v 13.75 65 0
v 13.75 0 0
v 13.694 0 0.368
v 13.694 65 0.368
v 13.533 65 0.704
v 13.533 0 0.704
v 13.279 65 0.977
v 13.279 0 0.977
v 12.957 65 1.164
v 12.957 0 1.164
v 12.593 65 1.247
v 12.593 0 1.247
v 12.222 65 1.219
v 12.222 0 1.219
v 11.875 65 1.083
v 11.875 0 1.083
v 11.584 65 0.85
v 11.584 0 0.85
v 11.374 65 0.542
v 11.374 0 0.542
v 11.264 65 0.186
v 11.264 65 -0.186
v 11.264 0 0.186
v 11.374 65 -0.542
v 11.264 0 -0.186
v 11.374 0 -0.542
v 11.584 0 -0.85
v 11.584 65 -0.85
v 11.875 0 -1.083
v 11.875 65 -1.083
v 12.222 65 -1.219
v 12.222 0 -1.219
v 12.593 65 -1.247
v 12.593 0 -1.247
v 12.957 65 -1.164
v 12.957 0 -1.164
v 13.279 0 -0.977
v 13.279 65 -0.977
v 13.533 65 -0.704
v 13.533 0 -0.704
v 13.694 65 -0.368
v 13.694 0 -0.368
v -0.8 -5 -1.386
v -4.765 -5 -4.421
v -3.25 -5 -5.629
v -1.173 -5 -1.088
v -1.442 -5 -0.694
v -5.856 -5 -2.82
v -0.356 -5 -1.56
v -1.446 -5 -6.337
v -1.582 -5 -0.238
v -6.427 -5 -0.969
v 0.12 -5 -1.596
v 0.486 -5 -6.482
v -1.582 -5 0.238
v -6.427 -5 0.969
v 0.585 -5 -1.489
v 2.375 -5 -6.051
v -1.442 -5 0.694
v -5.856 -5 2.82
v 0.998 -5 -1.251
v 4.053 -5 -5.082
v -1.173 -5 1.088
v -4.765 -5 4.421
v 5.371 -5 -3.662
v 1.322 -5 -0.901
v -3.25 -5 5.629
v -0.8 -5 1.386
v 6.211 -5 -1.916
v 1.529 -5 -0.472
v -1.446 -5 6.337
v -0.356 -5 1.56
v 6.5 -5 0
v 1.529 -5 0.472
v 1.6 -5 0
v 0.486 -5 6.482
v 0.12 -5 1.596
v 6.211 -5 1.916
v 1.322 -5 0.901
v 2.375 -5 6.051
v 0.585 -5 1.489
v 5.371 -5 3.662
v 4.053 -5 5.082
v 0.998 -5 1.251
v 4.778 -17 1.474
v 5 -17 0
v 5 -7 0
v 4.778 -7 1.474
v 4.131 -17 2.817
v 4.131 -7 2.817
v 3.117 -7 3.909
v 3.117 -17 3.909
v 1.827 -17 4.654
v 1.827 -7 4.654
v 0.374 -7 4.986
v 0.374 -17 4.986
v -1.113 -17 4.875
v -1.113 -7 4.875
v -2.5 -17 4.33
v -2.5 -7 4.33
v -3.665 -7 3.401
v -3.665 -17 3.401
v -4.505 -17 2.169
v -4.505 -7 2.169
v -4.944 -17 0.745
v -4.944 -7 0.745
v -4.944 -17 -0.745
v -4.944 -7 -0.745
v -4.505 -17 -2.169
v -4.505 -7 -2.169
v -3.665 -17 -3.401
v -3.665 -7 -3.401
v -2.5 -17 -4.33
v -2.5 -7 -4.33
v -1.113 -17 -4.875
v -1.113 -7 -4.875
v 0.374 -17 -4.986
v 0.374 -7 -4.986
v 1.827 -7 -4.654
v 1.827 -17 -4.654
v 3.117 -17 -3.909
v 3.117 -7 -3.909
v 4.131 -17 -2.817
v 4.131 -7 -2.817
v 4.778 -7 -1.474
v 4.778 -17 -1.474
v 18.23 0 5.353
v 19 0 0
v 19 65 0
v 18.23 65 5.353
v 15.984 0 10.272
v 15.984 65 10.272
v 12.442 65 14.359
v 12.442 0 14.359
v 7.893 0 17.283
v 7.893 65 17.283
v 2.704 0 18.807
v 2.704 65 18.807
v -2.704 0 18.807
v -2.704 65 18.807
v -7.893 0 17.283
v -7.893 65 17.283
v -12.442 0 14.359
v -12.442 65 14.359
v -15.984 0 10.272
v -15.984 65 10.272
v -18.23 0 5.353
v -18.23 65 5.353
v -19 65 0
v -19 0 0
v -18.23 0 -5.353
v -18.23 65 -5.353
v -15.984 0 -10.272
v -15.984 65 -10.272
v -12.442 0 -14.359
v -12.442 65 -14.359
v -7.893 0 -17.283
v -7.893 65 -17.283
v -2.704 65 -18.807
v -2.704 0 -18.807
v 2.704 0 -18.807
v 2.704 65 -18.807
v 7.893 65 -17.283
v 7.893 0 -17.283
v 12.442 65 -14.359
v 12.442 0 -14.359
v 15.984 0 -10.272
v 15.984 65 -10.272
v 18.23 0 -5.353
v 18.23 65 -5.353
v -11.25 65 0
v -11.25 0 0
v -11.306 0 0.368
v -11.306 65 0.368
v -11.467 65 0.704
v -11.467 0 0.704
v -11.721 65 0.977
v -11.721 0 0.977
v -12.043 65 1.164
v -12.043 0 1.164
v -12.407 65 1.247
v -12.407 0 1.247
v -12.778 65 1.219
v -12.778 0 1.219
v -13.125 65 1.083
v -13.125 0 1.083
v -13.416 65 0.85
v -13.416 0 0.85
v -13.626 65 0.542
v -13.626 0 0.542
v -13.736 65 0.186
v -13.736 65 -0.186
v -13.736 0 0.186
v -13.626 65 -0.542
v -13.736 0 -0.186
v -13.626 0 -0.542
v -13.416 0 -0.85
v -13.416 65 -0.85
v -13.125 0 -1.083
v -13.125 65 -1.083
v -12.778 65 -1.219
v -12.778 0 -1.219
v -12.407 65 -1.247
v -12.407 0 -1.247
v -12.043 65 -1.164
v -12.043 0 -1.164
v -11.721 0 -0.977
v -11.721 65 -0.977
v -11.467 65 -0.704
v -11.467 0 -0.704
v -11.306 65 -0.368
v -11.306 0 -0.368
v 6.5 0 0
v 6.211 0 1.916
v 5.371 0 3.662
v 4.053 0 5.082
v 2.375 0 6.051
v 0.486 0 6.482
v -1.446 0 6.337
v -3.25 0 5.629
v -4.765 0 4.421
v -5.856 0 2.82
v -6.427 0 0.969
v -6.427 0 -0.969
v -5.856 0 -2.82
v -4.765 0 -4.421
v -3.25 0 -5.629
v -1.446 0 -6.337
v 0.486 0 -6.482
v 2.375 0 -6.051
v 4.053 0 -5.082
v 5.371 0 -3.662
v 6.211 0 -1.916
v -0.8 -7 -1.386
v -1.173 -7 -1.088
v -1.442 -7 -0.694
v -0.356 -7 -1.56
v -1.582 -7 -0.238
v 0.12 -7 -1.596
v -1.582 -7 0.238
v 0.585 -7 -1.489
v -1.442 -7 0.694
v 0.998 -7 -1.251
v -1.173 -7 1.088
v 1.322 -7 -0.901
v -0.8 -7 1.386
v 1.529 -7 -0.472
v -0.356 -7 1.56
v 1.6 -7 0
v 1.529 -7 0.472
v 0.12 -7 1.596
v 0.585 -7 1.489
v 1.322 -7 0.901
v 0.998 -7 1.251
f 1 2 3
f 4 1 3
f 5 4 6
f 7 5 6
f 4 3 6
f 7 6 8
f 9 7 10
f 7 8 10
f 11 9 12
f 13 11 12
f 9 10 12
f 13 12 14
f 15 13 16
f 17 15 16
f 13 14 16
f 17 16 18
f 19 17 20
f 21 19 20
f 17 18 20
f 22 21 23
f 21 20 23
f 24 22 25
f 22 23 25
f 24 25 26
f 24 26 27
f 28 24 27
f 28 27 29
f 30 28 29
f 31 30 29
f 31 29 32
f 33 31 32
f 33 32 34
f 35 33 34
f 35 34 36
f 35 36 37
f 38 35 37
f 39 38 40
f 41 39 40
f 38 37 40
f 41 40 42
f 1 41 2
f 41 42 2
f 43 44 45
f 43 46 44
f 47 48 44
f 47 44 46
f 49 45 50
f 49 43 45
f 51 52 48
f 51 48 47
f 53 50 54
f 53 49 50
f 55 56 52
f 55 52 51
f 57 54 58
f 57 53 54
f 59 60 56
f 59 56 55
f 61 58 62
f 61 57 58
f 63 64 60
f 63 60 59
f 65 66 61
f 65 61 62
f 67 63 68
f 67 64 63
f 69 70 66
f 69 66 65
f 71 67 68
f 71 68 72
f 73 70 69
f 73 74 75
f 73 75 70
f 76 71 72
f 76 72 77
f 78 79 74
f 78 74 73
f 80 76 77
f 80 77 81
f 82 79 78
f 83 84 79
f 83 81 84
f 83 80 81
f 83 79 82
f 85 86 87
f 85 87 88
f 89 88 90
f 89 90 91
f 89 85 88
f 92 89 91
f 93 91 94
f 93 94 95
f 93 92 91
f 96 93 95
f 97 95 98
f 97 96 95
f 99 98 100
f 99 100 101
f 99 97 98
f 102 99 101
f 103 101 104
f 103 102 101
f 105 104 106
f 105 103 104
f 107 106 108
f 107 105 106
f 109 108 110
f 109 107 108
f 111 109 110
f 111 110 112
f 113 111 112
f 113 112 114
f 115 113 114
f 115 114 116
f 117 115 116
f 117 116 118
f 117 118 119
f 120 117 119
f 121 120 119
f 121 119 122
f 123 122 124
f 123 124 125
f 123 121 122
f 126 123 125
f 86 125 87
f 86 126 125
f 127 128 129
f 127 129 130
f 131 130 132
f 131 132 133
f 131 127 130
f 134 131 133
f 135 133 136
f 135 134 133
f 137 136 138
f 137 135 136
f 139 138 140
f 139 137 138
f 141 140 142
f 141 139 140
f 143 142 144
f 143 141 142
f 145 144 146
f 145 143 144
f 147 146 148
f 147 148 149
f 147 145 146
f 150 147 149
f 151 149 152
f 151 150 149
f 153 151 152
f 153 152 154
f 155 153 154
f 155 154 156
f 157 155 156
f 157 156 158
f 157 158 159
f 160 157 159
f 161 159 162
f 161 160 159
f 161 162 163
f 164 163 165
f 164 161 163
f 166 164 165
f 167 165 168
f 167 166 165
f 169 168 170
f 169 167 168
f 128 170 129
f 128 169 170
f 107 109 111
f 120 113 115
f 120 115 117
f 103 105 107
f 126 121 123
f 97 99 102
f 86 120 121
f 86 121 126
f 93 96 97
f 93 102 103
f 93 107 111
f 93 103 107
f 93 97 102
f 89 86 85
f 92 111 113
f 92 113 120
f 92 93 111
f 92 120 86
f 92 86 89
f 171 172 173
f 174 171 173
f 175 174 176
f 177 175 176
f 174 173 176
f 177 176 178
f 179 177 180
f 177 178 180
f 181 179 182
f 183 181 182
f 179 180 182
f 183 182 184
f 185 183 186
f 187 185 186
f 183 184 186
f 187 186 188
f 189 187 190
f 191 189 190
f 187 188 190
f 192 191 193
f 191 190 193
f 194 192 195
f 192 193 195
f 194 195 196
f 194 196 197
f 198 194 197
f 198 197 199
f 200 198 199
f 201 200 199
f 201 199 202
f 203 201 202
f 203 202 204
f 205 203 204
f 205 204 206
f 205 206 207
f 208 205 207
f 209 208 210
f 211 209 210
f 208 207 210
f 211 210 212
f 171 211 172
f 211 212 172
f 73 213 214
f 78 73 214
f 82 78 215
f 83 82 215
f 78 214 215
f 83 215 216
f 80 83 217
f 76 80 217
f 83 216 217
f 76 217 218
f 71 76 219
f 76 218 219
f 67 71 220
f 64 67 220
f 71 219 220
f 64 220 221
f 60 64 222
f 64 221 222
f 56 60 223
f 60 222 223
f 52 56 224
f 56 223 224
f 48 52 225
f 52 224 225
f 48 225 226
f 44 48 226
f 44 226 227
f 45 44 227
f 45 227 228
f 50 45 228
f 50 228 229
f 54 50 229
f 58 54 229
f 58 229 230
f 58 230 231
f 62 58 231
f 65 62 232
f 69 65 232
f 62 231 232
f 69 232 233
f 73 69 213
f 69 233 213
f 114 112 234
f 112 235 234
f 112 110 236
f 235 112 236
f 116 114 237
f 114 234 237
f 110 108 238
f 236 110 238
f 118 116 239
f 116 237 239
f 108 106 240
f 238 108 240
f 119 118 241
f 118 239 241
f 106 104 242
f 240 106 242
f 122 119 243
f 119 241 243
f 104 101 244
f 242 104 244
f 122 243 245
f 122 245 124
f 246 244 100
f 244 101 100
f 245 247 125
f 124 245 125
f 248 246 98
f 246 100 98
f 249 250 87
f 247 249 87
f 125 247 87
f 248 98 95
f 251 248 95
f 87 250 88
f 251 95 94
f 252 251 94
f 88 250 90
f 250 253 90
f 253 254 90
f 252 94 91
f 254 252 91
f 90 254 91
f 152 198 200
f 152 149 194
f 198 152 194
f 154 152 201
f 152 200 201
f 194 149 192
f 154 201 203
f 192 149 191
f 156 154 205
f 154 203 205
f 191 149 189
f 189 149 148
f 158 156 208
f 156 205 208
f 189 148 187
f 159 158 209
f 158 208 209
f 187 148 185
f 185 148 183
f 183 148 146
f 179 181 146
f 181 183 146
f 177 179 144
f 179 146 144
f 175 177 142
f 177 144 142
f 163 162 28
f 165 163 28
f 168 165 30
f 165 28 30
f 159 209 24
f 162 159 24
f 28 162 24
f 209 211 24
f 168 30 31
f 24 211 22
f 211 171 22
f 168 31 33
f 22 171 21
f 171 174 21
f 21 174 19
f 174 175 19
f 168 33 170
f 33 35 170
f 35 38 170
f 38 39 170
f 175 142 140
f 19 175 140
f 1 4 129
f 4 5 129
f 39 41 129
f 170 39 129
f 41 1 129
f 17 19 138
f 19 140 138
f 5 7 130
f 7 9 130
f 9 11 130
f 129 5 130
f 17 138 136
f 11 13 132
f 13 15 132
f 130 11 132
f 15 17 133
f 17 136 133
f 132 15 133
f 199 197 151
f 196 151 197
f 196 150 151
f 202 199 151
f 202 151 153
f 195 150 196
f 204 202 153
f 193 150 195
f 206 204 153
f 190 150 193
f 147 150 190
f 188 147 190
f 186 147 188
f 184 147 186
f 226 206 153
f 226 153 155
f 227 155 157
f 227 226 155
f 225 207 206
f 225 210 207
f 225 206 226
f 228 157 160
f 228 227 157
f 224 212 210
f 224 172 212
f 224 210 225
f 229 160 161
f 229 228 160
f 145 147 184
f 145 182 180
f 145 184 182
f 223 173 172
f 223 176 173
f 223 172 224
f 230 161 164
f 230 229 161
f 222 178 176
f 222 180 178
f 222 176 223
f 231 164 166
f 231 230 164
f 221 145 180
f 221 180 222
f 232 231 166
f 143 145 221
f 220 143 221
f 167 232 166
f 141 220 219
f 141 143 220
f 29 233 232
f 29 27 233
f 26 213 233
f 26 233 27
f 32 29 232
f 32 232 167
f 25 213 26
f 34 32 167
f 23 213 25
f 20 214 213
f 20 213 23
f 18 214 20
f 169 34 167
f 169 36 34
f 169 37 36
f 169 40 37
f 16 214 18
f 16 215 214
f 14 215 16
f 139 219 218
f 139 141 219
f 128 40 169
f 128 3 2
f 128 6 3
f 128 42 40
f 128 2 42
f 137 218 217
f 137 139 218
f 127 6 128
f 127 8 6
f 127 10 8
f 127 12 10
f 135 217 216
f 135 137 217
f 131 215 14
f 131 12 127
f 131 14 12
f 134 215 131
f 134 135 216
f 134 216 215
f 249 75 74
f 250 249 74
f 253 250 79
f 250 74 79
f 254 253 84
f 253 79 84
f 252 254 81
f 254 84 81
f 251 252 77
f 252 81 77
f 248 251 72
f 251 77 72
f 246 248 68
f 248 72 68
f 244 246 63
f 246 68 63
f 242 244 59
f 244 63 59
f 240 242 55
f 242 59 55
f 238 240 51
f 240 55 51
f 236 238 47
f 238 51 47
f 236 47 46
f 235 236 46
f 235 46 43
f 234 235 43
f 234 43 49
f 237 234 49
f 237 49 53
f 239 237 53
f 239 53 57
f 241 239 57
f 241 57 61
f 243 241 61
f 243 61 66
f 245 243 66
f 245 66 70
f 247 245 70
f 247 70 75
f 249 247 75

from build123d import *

# Parameters (mm, degrees)
F0_R     = 19
F0_R_2   = 1.25
F0_R_3   = 6.5
F1_DEPTH = 65
F2_DEPTH = 5
F3_R     = 1.6
F4_DEPTH = 12
F5_R     = 5
F5_R_2   = 1.6
F6_DEPTH = 10


with BuildPart() as f1:
    # F0 (on Front) → F1 (new body)
    with BuildSketch(Plane.XZ):
        Circle(F0_R)
        with Locations((-12.5, 0)):
            Circle(F0_R_2, mode=Mode.SUBTRACT)
        Circle(F0_R_3, mode=Mode.SUBTRACT)
        with Locations((12.5, 0)):
            Circle(F0_R_2, mode=Mode.SUBTRACT)
        Circle(F0_R_3)
    extrude(amount=-F1_DEPTH)

    # F0 (on Front) → F2 (join)
    with BuildSketch(Plane.XZ):
        Circle(F0_R_3)
    extrude(amount=F2_DEPTH)

    # F3 (on face) → F4 (join)
    with BuildSketch(Plane.XZ.offset(5)):
        Circle(F3_R)
    extrude(amount=F4_DEPTH)

    # F5 (on face) → F6 (join)
    with BuildSketch(Plane.XZ.offset(17)):
        Circle(F5_R)
        Circle(F5_R_2, mode=Mode.SUBTRACT)
    extrude(amount=-F6_DEPTH)


solid = f1.part
